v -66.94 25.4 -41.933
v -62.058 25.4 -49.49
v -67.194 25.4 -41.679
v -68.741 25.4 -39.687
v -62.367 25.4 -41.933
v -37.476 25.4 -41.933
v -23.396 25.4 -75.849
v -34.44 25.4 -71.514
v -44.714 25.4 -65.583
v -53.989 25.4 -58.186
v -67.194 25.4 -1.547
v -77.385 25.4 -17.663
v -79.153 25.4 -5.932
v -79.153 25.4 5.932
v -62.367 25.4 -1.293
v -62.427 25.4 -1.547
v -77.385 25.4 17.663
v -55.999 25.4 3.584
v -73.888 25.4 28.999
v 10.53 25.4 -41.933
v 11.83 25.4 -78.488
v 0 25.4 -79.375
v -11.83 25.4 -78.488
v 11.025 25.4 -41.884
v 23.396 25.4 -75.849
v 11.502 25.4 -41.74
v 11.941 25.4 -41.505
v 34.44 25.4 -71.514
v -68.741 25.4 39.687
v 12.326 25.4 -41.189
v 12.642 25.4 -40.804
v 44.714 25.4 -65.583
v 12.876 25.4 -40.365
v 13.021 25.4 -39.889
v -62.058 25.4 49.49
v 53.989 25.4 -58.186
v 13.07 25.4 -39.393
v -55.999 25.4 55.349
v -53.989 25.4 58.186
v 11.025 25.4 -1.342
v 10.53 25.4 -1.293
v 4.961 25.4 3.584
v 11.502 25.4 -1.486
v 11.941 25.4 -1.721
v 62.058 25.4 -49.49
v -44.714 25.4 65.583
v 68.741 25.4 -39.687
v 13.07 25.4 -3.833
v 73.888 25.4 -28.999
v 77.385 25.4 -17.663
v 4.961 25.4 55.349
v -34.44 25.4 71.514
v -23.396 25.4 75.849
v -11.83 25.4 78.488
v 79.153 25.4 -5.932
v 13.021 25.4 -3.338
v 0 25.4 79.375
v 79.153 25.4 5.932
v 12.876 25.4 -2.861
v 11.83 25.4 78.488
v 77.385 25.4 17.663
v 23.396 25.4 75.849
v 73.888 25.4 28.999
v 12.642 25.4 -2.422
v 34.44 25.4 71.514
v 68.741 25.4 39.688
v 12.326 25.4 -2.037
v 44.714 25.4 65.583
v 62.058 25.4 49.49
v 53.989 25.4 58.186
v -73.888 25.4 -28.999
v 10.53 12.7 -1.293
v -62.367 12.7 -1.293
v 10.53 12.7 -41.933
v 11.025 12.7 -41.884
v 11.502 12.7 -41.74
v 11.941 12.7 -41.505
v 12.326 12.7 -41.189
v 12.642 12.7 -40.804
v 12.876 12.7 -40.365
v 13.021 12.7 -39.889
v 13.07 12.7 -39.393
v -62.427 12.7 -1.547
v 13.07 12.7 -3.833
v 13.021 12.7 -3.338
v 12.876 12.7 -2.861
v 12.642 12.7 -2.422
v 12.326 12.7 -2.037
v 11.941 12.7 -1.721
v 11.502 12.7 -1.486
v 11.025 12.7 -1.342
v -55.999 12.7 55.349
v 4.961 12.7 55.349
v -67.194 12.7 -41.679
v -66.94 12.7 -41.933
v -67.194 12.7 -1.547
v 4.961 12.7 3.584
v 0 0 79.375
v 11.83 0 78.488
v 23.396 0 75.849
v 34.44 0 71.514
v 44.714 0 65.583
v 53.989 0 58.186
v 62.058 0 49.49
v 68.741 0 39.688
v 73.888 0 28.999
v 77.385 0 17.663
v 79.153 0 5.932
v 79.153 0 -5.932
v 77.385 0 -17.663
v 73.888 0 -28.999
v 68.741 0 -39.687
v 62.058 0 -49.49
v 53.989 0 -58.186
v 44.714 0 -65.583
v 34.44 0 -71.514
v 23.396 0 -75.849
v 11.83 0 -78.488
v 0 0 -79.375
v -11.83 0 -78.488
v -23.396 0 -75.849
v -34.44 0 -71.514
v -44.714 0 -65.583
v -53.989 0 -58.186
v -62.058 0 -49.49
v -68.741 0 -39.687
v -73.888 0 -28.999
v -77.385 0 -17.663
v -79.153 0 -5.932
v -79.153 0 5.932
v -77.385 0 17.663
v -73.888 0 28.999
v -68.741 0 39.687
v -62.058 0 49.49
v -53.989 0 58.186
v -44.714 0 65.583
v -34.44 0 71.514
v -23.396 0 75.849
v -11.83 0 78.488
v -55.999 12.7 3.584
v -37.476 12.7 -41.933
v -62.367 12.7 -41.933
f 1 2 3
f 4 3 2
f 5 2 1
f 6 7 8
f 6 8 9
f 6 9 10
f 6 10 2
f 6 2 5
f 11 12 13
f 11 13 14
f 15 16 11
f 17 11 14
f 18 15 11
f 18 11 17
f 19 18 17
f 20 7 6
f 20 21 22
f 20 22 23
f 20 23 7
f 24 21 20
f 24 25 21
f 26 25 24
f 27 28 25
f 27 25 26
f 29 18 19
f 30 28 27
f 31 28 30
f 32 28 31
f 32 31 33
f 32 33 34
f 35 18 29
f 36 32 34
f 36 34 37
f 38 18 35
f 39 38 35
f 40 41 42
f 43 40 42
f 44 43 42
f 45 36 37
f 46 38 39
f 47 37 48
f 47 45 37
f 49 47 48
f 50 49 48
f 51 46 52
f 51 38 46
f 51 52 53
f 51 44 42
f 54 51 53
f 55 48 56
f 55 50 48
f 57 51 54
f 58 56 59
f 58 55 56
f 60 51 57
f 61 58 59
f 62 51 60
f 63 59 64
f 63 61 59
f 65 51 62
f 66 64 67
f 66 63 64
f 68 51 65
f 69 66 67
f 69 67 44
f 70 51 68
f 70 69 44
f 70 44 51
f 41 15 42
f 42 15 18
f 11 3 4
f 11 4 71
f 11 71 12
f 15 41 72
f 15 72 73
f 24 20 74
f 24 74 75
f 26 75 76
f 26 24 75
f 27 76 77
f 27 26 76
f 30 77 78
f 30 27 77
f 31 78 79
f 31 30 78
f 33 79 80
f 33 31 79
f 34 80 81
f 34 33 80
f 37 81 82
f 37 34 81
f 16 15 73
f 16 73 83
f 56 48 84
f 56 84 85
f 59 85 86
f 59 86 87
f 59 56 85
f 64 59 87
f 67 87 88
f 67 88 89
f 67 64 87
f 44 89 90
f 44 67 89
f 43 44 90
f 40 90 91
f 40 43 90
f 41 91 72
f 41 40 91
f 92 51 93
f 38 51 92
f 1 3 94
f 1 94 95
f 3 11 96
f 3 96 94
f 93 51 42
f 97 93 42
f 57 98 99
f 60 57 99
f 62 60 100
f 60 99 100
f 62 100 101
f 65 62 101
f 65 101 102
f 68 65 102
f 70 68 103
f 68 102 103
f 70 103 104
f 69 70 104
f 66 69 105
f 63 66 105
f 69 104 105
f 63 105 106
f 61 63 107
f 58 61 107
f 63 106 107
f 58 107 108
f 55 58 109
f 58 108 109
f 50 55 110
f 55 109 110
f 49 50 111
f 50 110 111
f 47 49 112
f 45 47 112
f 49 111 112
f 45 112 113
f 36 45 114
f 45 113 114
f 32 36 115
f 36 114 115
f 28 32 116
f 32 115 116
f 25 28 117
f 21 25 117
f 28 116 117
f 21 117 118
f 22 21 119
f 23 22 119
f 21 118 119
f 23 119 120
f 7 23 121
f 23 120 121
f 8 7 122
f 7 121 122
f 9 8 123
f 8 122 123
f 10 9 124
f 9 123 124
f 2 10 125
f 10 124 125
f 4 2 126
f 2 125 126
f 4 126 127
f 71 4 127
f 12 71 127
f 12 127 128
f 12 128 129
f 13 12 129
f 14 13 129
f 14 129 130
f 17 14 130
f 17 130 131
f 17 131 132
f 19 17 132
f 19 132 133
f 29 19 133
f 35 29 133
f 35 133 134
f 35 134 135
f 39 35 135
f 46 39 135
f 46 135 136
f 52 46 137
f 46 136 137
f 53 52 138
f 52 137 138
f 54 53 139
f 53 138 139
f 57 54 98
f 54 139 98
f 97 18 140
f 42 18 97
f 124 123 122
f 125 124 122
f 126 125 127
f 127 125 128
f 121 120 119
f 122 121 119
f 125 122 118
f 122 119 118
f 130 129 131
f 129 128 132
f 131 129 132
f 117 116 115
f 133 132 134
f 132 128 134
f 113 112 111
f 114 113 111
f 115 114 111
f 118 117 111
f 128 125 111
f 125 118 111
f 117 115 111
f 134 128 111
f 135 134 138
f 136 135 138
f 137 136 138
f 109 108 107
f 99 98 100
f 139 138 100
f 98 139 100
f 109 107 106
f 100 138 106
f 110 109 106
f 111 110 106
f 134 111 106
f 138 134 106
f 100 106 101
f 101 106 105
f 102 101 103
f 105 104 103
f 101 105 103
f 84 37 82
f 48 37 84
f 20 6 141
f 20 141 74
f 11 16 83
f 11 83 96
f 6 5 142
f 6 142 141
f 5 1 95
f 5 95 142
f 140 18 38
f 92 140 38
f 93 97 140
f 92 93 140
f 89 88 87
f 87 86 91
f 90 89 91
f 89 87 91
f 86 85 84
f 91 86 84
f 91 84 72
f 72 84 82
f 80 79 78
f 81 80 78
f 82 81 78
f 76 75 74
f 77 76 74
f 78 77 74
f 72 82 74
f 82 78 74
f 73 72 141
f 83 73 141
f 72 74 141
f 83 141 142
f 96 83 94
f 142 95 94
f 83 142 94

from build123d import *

# Parameters (mm, degrees)
SKETCH1_R           = 79.375
BOSS_EXTRUDE1_DEPTH = 25.4
CUT_EXTRUDE1_DEPTH  = 12.7


with BuildPart() as part:
    # Sketch1 → Boss-Extrude1 (new body)
    with BuildSketch(Plane(origin=(0, 0, 0), x_dir=(1, 0, 0), z_dir=(0, 1, 0))):
        with Locations(Location((0, 0, 0), (0, 0, 270))):
            Circle(SKETCH1_R)
    extrude(amount=BOSS_EXTRUDE1_DEPTH)

    # Sketch2 → Cut-Extrude1 (cut)
    with BuildSketch(Plane(origin=(0, 25.4, 0), x_dir=(1, 0, 0), z_dir=(0, 1, 0))):
        Polygon((4.96096917, -3.583661606), (4.96096917, -7.48907527), (4.96096917, -8.37807527), (4.96096917, -50.554447942), (4.96096917, -51.443447942), (4.96096917, -55.348861606), (-55.99903083, -55.348861606), (-55.99903083, -51.443447942), (-55.99903083, -50.554447942), (-55.99903083, -8.37807527), (-55.99903083, -7.48907527), (-55.99903083, -3.583661606), align=None)
        with BuildLine():
            Line((13.069814764, 39.393138394), (13.069814764, 3.833138394))
            ThreePointArc((13.069814764, 3.833138394), (12.325865988, 2.03708717), (10.529814764, 1.293138394))
            Line((10.529814764, 1.293138394), (-37.221874349, 1.293138394))
            Line((-37.221874349, 1.293138394), (-37.475874266, 1.293138394))
            Line((-37.475874266, 1.293138394), (-62.366588392, 1.293138394))
            Line((-62.366588392, 1.293138394), (-62.426979393, 1.547138394))
            Line((-62.426979393, 1.547138394), (-67.193874266, 1.547138394))
            Line((-67.193874266, 1.547138394), (-67.193874266, 16.202925843))
            Line((-67.193874266, 16.202925843), (-67.193874266, 27.023351013))
            Line((-67.193874266, 27.023351013), (-67.193874266, 41.679138428))
            Line((-67.193874266, 41.679138428), (-66.939875034, 41.933134494))
            Line((-66.939875034, 41.933134494), (-62.366588392, 41.9331351))
            Line((-62.366588392, 41.9331351), (-37.475874266, 41.933138394))
            Line((-37.475874266, 41.933138394), (-37.221874349, 41.933138394))
            Line((-37.221874349, 41.933138394), (10.529814764, 41.933138394))
            ThreePointArc((10.529814764, 41.933138394), (12.325865988, 41.189189618), (13.069814764, 39.393138394))
        make_face()
    extrude(amount=-CUT_EXTRUDE1_DEPTH, mode=Mode.SUBTRACT)


solid = part.part
